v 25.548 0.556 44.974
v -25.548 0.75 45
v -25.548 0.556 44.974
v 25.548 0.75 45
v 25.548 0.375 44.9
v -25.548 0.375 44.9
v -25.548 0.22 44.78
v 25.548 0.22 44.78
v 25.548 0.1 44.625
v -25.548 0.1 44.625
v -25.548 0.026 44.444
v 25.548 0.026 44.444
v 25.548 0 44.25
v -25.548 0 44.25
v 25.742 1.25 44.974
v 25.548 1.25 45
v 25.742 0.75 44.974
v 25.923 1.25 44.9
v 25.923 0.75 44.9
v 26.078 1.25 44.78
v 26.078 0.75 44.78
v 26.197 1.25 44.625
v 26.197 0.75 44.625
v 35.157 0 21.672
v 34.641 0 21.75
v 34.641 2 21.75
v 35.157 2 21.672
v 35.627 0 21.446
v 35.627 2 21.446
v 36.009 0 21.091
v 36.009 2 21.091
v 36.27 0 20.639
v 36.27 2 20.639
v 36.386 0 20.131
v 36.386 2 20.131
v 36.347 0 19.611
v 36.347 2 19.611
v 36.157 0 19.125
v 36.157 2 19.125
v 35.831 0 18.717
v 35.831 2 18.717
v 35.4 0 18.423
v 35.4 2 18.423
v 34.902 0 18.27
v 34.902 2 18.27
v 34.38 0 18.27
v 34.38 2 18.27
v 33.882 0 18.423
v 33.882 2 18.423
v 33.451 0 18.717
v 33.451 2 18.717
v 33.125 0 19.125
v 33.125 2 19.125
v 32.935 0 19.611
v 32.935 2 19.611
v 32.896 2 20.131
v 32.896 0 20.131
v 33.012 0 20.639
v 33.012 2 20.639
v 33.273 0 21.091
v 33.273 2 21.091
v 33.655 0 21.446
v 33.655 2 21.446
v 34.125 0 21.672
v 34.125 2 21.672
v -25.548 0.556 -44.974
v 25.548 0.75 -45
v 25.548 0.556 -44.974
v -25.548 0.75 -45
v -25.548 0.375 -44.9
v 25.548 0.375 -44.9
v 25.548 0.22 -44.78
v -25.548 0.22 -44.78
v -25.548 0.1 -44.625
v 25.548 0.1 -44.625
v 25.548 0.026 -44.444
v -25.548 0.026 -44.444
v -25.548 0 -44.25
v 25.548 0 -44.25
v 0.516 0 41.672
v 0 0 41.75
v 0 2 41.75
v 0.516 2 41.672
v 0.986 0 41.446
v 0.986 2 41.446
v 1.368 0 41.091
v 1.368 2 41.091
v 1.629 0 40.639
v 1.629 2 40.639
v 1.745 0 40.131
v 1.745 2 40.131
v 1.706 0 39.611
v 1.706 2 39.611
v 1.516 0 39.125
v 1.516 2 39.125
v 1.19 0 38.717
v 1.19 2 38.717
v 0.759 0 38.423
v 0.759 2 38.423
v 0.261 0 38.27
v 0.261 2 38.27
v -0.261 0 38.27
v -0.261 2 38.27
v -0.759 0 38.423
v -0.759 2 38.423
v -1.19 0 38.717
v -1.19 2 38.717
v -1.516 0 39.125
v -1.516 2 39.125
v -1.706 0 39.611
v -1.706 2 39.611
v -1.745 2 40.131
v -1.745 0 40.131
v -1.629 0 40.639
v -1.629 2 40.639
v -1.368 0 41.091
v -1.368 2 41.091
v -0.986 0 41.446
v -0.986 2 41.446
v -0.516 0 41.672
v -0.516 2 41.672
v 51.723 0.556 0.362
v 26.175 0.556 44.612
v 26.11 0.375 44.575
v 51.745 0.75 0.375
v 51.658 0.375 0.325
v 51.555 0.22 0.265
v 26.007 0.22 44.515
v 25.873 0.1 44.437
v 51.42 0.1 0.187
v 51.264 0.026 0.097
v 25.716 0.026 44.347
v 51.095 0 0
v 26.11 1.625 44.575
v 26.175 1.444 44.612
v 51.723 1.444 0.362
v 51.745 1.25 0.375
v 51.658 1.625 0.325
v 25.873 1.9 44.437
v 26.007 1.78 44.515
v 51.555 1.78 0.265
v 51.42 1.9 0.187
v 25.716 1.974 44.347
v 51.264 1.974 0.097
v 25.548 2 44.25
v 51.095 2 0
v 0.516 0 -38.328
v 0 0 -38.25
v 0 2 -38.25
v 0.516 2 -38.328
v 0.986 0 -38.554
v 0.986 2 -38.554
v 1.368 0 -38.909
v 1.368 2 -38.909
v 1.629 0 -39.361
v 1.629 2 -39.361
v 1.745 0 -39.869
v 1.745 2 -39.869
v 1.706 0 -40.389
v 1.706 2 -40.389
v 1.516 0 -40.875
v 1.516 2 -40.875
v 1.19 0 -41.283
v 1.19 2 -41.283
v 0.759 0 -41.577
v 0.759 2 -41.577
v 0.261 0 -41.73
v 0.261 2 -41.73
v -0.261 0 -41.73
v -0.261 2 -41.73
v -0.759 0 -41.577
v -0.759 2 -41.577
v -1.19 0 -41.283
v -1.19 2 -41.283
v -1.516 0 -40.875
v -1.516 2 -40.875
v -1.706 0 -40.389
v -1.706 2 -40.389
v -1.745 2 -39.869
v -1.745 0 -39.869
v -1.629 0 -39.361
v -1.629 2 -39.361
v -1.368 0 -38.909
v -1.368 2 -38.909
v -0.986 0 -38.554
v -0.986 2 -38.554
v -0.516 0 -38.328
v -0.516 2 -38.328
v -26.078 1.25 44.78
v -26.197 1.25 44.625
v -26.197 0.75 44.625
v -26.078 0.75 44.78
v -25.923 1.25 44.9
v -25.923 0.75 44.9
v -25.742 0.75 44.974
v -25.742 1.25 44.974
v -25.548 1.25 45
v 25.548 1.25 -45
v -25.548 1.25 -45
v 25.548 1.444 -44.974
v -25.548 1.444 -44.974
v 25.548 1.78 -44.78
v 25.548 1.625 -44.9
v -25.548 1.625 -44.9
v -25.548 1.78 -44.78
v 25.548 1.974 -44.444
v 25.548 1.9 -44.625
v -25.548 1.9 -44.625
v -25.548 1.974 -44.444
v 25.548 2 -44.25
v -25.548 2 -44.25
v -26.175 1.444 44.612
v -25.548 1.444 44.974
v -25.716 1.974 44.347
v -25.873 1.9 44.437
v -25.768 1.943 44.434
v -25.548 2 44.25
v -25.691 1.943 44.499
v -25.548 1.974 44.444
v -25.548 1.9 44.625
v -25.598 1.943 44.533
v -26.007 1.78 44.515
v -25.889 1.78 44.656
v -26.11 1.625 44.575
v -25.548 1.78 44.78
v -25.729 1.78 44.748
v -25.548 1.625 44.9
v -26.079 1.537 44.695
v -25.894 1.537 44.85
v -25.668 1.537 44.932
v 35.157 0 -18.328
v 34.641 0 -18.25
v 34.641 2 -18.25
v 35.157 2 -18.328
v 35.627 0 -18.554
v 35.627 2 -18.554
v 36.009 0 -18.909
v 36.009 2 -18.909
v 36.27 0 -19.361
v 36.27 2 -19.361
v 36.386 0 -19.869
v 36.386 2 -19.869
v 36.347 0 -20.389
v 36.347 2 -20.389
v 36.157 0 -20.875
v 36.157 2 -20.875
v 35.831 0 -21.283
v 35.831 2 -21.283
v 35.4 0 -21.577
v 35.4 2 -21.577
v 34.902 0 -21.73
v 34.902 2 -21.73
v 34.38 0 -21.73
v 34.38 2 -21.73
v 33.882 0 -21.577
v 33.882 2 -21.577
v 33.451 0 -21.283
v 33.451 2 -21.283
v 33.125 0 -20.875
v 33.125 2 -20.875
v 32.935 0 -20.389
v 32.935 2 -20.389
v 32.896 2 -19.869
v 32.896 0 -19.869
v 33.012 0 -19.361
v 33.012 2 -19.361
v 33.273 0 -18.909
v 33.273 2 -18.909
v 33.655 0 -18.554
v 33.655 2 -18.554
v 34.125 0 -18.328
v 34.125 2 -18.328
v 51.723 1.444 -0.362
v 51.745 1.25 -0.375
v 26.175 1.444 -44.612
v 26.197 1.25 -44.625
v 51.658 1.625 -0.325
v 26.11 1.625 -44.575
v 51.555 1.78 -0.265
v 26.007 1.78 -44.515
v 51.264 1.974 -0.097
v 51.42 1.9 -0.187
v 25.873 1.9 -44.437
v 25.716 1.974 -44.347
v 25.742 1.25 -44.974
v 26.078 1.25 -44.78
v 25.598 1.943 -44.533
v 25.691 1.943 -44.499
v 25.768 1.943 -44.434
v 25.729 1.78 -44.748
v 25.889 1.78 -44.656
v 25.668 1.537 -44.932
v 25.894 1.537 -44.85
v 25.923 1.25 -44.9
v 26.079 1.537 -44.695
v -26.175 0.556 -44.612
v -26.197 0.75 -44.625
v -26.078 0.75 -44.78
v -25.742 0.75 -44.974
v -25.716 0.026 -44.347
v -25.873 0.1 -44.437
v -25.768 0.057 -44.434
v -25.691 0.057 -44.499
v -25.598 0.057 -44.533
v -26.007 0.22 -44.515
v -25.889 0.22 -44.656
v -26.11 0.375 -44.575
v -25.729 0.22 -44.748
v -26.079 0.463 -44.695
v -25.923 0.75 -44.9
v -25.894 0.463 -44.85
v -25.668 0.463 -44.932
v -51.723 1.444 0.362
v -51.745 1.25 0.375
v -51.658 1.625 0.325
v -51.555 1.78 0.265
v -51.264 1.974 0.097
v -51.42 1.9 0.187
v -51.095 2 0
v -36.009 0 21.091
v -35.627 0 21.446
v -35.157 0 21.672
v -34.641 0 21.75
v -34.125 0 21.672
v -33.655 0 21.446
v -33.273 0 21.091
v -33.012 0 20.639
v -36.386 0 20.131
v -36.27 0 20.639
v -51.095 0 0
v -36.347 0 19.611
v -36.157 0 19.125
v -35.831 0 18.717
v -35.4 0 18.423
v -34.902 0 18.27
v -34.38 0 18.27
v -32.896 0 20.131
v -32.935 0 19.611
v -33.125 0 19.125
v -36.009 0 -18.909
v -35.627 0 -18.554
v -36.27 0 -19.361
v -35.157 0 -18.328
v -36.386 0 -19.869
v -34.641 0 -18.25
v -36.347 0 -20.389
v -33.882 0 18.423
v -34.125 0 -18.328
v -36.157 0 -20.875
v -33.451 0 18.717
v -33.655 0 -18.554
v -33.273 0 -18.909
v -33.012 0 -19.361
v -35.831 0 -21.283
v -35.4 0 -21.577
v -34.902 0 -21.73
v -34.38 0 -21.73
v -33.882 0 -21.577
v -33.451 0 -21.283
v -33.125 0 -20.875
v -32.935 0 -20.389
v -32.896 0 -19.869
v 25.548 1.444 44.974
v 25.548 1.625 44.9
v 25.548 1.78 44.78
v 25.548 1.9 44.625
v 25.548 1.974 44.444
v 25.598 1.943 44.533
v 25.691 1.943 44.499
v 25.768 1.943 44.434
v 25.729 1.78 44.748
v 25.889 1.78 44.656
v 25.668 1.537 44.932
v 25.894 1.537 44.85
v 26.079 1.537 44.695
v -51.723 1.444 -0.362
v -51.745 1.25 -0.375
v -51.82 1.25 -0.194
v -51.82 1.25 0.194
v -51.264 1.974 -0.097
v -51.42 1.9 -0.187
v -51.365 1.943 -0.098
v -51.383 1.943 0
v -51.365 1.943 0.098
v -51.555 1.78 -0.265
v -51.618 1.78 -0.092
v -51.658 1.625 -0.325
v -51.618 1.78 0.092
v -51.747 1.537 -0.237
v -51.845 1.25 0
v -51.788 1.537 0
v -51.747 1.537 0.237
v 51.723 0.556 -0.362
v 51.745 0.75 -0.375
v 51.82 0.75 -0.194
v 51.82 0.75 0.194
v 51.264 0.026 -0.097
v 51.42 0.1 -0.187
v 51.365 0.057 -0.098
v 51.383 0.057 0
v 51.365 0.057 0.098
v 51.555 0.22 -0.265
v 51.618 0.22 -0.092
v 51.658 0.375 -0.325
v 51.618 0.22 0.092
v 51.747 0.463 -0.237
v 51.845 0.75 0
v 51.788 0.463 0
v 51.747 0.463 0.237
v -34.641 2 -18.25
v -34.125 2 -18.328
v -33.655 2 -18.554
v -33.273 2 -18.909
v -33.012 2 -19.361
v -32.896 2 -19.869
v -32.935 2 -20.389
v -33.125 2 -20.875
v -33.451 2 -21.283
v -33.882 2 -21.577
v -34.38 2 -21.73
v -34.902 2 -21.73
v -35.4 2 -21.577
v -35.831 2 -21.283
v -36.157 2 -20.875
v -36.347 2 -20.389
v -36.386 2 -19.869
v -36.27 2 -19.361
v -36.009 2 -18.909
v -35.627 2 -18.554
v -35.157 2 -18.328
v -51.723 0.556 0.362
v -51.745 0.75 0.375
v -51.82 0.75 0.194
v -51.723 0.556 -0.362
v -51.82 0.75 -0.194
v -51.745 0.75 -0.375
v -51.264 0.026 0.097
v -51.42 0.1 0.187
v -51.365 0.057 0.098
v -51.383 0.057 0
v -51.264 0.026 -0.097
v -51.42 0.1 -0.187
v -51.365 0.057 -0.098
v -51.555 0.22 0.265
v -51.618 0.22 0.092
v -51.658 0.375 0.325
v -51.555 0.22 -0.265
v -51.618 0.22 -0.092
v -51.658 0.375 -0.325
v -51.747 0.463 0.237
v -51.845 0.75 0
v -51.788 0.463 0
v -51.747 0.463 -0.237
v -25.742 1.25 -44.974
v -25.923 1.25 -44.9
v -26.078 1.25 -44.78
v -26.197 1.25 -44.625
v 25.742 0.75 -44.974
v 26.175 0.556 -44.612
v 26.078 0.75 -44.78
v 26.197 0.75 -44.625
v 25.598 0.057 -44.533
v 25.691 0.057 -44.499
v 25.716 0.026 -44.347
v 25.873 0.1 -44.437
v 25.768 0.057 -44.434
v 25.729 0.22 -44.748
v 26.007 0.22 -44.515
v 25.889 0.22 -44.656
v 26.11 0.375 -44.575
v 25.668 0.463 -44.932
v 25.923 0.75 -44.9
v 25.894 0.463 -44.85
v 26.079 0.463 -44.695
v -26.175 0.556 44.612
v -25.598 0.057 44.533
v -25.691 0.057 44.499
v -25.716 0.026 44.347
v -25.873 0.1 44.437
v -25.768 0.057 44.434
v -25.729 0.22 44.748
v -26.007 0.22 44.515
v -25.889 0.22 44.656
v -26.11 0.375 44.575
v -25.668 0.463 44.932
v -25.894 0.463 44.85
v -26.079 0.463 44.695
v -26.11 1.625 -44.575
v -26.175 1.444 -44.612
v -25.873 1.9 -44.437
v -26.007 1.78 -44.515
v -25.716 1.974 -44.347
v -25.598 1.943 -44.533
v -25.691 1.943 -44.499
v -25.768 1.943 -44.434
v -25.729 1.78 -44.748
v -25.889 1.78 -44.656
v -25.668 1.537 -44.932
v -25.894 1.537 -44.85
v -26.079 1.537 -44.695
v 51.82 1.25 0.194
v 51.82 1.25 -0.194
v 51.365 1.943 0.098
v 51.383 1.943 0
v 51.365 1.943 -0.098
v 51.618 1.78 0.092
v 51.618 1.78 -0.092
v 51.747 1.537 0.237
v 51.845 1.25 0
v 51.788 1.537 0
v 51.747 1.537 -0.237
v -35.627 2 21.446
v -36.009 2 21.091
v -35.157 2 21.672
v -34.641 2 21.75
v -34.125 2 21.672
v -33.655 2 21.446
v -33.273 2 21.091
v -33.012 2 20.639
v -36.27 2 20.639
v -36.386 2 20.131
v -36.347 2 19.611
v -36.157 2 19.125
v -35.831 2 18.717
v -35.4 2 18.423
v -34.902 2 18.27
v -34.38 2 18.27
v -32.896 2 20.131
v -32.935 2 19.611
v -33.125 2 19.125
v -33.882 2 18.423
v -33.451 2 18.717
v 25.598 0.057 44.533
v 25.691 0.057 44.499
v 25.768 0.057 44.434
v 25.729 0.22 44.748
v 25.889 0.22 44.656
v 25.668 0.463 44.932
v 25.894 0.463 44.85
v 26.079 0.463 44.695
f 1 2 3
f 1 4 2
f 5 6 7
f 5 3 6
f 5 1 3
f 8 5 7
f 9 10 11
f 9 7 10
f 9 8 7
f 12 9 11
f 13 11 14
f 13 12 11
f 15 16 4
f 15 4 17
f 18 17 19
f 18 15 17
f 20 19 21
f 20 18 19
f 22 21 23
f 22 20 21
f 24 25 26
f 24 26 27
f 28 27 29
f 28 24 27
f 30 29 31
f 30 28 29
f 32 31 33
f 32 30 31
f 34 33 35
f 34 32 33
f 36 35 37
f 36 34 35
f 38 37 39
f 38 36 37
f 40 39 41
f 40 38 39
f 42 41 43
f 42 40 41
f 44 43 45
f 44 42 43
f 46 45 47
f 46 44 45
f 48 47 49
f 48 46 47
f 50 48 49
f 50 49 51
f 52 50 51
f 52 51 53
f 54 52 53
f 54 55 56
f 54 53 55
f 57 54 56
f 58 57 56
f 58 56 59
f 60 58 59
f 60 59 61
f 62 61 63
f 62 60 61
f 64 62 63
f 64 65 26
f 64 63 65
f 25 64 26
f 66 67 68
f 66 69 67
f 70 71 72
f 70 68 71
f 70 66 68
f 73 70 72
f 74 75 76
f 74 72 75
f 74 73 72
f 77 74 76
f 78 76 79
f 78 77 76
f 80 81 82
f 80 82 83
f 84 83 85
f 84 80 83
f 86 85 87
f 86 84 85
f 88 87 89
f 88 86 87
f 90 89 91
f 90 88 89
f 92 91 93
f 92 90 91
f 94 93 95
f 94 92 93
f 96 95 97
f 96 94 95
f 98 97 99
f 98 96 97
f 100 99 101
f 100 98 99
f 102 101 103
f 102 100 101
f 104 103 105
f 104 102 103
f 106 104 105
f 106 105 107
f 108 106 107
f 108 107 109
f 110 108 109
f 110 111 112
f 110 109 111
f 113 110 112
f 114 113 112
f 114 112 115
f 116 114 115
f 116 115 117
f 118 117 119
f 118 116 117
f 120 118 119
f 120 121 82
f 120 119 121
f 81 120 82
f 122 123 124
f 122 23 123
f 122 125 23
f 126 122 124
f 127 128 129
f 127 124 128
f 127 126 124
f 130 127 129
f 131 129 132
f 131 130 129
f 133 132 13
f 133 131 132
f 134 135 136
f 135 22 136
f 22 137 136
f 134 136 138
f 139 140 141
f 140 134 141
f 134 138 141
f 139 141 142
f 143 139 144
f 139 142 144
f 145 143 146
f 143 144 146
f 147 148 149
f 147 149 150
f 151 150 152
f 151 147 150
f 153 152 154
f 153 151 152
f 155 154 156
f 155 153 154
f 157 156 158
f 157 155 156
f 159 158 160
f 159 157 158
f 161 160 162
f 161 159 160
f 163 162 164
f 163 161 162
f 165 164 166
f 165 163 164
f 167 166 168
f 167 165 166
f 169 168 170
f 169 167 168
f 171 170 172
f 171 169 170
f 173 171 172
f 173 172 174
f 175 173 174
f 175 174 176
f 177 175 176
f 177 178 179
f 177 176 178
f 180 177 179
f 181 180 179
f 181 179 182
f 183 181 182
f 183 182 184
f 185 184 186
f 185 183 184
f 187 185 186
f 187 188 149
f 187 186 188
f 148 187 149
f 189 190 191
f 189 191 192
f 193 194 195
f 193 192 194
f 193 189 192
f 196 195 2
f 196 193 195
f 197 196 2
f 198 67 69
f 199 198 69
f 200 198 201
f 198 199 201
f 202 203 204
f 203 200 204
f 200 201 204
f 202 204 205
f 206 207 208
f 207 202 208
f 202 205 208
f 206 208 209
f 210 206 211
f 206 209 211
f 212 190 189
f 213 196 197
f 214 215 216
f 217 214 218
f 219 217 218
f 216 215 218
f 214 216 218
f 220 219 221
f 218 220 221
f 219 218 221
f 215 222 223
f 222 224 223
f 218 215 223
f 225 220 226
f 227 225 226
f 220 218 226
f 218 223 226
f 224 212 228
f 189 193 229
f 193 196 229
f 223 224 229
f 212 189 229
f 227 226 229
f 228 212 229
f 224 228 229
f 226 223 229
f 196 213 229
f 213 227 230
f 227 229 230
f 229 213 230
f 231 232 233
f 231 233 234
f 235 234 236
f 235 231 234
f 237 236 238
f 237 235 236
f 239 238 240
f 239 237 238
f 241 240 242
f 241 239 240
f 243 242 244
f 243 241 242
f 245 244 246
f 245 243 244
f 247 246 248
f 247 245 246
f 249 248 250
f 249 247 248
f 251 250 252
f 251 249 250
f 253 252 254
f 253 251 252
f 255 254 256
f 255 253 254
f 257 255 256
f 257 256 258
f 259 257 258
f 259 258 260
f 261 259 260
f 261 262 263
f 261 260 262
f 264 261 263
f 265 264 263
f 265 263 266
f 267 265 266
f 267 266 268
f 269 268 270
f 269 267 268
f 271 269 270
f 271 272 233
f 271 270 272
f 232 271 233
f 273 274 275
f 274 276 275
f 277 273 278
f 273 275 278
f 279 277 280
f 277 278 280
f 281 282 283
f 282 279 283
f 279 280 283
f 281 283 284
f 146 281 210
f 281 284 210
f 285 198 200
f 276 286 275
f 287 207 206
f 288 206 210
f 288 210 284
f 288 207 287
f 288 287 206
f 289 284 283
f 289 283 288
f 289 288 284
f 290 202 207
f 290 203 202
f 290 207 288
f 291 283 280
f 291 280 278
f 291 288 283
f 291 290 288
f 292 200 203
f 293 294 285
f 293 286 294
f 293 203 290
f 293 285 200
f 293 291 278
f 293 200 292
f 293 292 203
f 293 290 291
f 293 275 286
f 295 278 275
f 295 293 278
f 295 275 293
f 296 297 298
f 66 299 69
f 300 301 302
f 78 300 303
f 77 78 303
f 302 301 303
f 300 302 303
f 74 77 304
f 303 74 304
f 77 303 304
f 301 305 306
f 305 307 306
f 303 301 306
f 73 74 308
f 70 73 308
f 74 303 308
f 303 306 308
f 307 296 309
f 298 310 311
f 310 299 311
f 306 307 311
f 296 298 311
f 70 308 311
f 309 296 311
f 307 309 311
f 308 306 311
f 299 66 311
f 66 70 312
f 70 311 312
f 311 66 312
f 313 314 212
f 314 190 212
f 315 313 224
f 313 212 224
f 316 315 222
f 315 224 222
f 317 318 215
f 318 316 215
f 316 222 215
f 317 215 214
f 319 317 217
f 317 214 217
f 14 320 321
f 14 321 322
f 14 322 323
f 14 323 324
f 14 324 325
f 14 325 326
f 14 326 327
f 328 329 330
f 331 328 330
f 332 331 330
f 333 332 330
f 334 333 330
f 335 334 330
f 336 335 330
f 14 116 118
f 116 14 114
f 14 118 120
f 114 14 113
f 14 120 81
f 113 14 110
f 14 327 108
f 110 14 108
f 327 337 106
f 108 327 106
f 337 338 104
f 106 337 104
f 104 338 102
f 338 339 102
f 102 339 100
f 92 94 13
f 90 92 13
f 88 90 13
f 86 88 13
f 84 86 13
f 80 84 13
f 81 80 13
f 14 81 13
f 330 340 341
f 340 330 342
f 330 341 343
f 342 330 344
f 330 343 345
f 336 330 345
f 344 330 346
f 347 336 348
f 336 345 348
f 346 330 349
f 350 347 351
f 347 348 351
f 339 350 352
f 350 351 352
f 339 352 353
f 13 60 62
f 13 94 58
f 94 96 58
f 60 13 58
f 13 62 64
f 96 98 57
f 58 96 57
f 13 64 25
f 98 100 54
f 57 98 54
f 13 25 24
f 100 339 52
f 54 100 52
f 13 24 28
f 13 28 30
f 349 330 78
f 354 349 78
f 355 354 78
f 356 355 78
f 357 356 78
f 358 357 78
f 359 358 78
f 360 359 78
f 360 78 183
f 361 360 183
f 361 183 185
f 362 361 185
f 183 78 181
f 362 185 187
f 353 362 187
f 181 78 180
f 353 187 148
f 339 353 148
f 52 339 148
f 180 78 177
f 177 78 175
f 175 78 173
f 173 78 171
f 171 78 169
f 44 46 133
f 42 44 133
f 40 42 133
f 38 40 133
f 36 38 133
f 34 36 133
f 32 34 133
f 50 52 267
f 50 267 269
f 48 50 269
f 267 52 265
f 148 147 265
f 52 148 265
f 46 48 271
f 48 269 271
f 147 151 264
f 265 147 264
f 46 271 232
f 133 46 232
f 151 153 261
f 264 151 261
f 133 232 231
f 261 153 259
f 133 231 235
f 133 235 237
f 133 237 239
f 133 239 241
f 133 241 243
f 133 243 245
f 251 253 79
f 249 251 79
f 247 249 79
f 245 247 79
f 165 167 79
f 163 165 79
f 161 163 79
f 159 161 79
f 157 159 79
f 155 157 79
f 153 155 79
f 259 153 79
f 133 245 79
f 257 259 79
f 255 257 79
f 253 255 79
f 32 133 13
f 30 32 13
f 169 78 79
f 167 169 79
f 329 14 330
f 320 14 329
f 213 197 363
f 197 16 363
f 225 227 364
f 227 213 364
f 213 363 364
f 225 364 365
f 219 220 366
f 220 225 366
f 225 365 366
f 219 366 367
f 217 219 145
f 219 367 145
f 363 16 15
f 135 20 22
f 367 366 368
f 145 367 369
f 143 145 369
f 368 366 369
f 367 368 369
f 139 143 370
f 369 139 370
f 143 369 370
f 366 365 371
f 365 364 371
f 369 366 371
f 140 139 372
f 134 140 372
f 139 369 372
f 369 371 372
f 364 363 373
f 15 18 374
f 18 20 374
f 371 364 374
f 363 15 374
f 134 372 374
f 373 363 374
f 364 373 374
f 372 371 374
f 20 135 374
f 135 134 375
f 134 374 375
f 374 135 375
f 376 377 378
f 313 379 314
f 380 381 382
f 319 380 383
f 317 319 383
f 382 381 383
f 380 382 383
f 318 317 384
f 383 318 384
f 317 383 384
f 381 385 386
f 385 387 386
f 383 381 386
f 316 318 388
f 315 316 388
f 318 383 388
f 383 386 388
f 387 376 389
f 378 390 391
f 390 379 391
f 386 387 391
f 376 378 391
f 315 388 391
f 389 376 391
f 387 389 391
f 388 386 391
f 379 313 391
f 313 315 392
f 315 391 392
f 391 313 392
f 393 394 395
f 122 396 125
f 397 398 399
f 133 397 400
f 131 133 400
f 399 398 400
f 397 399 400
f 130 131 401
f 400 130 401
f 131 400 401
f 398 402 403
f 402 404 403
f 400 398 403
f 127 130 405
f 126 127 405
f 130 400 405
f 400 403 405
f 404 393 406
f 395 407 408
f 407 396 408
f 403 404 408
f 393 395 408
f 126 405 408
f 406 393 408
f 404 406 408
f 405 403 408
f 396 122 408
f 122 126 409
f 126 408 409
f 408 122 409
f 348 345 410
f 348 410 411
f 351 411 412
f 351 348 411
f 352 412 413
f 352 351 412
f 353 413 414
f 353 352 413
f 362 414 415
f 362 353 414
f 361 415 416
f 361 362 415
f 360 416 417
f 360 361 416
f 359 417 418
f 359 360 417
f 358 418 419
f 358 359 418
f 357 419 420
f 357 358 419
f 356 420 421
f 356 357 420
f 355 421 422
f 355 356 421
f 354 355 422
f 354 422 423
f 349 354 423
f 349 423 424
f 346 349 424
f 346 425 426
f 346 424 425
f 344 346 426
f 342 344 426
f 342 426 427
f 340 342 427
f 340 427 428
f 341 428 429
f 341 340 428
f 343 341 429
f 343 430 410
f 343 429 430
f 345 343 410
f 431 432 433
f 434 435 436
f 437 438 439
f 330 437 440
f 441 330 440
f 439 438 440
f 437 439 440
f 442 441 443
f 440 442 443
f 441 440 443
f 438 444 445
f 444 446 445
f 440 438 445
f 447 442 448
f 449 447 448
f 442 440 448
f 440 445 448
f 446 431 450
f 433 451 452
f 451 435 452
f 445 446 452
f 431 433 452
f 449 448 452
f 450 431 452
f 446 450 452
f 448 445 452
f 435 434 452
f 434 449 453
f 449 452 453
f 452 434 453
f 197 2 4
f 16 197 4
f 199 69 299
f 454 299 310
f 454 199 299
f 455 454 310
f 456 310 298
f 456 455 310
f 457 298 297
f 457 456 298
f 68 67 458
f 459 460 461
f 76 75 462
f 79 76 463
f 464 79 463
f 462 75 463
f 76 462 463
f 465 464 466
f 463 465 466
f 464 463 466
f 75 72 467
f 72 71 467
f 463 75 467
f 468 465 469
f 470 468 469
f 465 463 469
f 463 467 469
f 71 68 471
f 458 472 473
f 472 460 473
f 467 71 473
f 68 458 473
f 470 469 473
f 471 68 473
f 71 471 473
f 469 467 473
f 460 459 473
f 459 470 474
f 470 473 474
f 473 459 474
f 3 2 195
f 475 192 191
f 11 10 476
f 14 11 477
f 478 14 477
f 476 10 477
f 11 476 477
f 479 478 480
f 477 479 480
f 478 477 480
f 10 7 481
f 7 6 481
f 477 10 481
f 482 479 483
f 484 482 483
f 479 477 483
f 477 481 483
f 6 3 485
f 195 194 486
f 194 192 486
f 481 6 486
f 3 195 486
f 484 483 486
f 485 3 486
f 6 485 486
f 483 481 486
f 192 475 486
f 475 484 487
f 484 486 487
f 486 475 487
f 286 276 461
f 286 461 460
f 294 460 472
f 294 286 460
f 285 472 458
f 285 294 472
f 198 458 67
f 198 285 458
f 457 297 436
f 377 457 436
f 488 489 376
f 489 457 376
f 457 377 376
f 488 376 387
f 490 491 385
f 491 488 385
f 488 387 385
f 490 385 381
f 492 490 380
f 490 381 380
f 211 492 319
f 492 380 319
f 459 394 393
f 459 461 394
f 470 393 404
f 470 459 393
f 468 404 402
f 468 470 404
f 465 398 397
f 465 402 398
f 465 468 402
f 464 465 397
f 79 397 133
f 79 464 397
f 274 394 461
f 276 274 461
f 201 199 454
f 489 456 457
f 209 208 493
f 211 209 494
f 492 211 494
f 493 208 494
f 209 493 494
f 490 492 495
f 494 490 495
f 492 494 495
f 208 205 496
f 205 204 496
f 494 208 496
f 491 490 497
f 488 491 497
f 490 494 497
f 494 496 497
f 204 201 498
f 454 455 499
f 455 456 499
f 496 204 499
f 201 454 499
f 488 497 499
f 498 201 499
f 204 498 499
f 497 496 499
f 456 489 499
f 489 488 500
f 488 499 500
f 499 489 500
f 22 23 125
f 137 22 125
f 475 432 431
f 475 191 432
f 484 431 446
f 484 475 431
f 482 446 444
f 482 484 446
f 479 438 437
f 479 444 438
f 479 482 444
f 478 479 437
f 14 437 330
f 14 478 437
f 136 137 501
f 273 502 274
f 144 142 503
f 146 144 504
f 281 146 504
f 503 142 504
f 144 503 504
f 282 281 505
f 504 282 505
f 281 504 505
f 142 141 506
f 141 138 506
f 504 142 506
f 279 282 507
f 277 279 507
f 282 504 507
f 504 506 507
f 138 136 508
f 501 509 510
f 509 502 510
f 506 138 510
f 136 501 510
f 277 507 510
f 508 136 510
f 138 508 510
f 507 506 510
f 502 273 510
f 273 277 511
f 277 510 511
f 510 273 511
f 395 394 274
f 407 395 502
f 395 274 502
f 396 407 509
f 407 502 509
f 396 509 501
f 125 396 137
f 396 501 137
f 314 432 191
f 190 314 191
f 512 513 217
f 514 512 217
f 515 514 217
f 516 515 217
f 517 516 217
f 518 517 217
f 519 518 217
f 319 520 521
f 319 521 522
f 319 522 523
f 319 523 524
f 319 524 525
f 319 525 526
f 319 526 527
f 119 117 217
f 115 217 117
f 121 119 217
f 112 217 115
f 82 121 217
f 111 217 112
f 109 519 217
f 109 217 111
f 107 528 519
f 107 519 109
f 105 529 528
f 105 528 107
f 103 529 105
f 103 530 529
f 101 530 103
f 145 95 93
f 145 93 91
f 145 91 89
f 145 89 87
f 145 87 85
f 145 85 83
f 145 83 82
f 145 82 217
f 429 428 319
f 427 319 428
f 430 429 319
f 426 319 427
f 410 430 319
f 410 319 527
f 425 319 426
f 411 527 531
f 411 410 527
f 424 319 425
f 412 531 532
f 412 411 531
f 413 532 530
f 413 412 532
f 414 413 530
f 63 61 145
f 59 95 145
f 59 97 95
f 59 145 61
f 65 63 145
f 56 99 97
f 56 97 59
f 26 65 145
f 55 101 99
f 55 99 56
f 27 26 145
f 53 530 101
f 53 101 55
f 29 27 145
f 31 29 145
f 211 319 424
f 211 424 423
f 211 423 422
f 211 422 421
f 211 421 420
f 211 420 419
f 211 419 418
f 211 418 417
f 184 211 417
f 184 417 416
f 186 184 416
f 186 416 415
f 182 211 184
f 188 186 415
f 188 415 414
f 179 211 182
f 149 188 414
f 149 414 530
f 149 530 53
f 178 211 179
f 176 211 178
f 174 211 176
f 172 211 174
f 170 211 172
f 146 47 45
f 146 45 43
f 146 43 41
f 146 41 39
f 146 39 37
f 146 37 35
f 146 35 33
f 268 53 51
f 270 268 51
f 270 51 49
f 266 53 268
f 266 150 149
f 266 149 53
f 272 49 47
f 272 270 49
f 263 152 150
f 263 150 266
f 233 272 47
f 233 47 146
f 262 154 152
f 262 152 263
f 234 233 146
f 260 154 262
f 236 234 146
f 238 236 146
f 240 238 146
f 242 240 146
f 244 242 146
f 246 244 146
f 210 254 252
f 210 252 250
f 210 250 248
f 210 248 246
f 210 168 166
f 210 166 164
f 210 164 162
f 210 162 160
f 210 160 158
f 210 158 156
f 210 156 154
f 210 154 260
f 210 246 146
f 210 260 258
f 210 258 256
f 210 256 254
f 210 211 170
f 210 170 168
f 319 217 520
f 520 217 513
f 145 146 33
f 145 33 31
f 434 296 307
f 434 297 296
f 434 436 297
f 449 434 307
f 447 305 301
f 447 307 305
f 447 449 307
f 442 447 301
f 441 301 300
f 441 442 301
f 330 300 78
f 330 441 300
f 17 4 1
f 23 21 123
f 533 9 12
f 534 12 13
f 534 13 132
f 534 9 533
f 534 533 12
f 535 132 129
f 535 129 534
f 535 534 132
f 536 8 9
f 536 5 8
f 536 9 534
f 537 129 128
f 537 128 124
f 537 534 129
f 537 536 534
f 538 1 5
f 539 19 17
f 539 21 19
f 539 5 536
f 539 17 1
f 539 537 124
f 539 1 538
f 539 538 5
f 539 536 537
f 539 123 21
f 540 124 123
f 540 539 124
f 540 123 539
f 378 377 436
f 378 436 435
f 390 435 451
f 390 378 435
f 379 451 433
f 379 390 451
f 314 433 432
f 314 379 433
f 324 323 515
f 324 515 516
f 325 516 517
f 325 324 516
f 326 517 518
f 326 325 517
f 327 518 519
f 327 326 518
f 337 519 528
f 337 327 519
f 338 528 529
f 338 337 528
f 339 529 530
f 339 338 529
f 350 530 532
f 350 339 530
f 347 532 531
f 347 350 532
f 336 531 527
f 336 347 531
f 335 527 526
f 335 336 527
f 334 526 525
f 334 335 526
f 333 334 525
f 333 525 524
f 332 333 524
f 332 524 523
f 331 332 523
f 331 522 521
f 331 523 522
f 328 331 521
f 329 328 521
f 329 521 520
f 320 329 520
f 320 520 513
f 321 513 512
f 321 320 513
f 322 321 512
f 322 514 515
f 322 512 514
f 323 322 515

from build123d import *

# Parameters (mm, degrees)
BOSS_EXTRUDE1_DEPTH     = 2
FILLET3_R               = 0.75
CUT_EXTRUDE2_DEPTH      = 69.680097177
CUT_EXTRUDE2_DEPTH_BACK = 35
SKETCH3_R               = 1.75


with BuildPart() as part:
    # Sketch2 → Boss-Extrude1 (new body)
    with BuildSketch(Plane(origin=(0, 0, 0), x_dir=(1, 0, 0), z_dir=(0, 1, 0))):
        Polygon((51.961524227, 0), (25.980762114, 45), (-25.980762114, 45), (-51.961524227, 0), (-25.980762114, -45), (25.980762114, -45), align=None)
    extrude(amount=BOSS_EXTRUDE1_DEPTH)

    # Fillet3
    fillet3_edges = [part.edges().sort_by_distance(p)[0] for p in [
        (25.980762114, 1, 45),
        (51.961524227, 1, 0),
        (25.980762114, 1, -45),
        (-25.980762114, 1, 45),
        (-25.980762114, 1, -45),
        (-51.961524227, 1, 0),
        (38.97114317, 0, -22.5),
        (0, 0, -45),
        (-38.97114317, 0, -22.5),
        (-38.97114317, 0, 22.5),
        (0, 0, 45),
        (38.97114317, 0, 22.5),
        (0, 2, 45),
        (-38.97114317, 2, 22.5),
        (-38.97114317, 2, -22.5),
        (0, 2, -45),
        (38.97114317, 2, -22.5),
        (38.97114317, 2, 22.5),
    ]]
    fillet(fillet3_edges, radius=FILLET3_R)

    # Sketch3 → Cut-Extrude2 (cut, two sides: drawn at the far end of the back side and taken through both)
    with BuildSketch(Plane(origin=(0, 0, 0), x_dir=(1, 0, 0), z_dir=(0, 1, 0)).offset(-CUT_EXTRUDE2_DEPTH_BACK)):
        with Locations((0, 40)):
            Circle(SKETCH3_R)
        with Locations((34.641016151, 20)):
            Circle(SKETCH3_R)
        with Locations((34.641016151, -20)):
            Circle(SKETCH3_R)
        with Locations((0, -40)):
            Circle(SKETCH3_R)
        with Locations((-34.641016151, -20)):
            Circle(SKETCH3_R)
        with Locations((-34.641016151, 20)):
            Circle(SKETCH3_R)
    extrude(amount=CUT_EXTRUDE2_DEPTH + CUT_EXTRUDE2_DEPTH_BACK, mode=Mode.SUBTRACT)


solid = part.part
